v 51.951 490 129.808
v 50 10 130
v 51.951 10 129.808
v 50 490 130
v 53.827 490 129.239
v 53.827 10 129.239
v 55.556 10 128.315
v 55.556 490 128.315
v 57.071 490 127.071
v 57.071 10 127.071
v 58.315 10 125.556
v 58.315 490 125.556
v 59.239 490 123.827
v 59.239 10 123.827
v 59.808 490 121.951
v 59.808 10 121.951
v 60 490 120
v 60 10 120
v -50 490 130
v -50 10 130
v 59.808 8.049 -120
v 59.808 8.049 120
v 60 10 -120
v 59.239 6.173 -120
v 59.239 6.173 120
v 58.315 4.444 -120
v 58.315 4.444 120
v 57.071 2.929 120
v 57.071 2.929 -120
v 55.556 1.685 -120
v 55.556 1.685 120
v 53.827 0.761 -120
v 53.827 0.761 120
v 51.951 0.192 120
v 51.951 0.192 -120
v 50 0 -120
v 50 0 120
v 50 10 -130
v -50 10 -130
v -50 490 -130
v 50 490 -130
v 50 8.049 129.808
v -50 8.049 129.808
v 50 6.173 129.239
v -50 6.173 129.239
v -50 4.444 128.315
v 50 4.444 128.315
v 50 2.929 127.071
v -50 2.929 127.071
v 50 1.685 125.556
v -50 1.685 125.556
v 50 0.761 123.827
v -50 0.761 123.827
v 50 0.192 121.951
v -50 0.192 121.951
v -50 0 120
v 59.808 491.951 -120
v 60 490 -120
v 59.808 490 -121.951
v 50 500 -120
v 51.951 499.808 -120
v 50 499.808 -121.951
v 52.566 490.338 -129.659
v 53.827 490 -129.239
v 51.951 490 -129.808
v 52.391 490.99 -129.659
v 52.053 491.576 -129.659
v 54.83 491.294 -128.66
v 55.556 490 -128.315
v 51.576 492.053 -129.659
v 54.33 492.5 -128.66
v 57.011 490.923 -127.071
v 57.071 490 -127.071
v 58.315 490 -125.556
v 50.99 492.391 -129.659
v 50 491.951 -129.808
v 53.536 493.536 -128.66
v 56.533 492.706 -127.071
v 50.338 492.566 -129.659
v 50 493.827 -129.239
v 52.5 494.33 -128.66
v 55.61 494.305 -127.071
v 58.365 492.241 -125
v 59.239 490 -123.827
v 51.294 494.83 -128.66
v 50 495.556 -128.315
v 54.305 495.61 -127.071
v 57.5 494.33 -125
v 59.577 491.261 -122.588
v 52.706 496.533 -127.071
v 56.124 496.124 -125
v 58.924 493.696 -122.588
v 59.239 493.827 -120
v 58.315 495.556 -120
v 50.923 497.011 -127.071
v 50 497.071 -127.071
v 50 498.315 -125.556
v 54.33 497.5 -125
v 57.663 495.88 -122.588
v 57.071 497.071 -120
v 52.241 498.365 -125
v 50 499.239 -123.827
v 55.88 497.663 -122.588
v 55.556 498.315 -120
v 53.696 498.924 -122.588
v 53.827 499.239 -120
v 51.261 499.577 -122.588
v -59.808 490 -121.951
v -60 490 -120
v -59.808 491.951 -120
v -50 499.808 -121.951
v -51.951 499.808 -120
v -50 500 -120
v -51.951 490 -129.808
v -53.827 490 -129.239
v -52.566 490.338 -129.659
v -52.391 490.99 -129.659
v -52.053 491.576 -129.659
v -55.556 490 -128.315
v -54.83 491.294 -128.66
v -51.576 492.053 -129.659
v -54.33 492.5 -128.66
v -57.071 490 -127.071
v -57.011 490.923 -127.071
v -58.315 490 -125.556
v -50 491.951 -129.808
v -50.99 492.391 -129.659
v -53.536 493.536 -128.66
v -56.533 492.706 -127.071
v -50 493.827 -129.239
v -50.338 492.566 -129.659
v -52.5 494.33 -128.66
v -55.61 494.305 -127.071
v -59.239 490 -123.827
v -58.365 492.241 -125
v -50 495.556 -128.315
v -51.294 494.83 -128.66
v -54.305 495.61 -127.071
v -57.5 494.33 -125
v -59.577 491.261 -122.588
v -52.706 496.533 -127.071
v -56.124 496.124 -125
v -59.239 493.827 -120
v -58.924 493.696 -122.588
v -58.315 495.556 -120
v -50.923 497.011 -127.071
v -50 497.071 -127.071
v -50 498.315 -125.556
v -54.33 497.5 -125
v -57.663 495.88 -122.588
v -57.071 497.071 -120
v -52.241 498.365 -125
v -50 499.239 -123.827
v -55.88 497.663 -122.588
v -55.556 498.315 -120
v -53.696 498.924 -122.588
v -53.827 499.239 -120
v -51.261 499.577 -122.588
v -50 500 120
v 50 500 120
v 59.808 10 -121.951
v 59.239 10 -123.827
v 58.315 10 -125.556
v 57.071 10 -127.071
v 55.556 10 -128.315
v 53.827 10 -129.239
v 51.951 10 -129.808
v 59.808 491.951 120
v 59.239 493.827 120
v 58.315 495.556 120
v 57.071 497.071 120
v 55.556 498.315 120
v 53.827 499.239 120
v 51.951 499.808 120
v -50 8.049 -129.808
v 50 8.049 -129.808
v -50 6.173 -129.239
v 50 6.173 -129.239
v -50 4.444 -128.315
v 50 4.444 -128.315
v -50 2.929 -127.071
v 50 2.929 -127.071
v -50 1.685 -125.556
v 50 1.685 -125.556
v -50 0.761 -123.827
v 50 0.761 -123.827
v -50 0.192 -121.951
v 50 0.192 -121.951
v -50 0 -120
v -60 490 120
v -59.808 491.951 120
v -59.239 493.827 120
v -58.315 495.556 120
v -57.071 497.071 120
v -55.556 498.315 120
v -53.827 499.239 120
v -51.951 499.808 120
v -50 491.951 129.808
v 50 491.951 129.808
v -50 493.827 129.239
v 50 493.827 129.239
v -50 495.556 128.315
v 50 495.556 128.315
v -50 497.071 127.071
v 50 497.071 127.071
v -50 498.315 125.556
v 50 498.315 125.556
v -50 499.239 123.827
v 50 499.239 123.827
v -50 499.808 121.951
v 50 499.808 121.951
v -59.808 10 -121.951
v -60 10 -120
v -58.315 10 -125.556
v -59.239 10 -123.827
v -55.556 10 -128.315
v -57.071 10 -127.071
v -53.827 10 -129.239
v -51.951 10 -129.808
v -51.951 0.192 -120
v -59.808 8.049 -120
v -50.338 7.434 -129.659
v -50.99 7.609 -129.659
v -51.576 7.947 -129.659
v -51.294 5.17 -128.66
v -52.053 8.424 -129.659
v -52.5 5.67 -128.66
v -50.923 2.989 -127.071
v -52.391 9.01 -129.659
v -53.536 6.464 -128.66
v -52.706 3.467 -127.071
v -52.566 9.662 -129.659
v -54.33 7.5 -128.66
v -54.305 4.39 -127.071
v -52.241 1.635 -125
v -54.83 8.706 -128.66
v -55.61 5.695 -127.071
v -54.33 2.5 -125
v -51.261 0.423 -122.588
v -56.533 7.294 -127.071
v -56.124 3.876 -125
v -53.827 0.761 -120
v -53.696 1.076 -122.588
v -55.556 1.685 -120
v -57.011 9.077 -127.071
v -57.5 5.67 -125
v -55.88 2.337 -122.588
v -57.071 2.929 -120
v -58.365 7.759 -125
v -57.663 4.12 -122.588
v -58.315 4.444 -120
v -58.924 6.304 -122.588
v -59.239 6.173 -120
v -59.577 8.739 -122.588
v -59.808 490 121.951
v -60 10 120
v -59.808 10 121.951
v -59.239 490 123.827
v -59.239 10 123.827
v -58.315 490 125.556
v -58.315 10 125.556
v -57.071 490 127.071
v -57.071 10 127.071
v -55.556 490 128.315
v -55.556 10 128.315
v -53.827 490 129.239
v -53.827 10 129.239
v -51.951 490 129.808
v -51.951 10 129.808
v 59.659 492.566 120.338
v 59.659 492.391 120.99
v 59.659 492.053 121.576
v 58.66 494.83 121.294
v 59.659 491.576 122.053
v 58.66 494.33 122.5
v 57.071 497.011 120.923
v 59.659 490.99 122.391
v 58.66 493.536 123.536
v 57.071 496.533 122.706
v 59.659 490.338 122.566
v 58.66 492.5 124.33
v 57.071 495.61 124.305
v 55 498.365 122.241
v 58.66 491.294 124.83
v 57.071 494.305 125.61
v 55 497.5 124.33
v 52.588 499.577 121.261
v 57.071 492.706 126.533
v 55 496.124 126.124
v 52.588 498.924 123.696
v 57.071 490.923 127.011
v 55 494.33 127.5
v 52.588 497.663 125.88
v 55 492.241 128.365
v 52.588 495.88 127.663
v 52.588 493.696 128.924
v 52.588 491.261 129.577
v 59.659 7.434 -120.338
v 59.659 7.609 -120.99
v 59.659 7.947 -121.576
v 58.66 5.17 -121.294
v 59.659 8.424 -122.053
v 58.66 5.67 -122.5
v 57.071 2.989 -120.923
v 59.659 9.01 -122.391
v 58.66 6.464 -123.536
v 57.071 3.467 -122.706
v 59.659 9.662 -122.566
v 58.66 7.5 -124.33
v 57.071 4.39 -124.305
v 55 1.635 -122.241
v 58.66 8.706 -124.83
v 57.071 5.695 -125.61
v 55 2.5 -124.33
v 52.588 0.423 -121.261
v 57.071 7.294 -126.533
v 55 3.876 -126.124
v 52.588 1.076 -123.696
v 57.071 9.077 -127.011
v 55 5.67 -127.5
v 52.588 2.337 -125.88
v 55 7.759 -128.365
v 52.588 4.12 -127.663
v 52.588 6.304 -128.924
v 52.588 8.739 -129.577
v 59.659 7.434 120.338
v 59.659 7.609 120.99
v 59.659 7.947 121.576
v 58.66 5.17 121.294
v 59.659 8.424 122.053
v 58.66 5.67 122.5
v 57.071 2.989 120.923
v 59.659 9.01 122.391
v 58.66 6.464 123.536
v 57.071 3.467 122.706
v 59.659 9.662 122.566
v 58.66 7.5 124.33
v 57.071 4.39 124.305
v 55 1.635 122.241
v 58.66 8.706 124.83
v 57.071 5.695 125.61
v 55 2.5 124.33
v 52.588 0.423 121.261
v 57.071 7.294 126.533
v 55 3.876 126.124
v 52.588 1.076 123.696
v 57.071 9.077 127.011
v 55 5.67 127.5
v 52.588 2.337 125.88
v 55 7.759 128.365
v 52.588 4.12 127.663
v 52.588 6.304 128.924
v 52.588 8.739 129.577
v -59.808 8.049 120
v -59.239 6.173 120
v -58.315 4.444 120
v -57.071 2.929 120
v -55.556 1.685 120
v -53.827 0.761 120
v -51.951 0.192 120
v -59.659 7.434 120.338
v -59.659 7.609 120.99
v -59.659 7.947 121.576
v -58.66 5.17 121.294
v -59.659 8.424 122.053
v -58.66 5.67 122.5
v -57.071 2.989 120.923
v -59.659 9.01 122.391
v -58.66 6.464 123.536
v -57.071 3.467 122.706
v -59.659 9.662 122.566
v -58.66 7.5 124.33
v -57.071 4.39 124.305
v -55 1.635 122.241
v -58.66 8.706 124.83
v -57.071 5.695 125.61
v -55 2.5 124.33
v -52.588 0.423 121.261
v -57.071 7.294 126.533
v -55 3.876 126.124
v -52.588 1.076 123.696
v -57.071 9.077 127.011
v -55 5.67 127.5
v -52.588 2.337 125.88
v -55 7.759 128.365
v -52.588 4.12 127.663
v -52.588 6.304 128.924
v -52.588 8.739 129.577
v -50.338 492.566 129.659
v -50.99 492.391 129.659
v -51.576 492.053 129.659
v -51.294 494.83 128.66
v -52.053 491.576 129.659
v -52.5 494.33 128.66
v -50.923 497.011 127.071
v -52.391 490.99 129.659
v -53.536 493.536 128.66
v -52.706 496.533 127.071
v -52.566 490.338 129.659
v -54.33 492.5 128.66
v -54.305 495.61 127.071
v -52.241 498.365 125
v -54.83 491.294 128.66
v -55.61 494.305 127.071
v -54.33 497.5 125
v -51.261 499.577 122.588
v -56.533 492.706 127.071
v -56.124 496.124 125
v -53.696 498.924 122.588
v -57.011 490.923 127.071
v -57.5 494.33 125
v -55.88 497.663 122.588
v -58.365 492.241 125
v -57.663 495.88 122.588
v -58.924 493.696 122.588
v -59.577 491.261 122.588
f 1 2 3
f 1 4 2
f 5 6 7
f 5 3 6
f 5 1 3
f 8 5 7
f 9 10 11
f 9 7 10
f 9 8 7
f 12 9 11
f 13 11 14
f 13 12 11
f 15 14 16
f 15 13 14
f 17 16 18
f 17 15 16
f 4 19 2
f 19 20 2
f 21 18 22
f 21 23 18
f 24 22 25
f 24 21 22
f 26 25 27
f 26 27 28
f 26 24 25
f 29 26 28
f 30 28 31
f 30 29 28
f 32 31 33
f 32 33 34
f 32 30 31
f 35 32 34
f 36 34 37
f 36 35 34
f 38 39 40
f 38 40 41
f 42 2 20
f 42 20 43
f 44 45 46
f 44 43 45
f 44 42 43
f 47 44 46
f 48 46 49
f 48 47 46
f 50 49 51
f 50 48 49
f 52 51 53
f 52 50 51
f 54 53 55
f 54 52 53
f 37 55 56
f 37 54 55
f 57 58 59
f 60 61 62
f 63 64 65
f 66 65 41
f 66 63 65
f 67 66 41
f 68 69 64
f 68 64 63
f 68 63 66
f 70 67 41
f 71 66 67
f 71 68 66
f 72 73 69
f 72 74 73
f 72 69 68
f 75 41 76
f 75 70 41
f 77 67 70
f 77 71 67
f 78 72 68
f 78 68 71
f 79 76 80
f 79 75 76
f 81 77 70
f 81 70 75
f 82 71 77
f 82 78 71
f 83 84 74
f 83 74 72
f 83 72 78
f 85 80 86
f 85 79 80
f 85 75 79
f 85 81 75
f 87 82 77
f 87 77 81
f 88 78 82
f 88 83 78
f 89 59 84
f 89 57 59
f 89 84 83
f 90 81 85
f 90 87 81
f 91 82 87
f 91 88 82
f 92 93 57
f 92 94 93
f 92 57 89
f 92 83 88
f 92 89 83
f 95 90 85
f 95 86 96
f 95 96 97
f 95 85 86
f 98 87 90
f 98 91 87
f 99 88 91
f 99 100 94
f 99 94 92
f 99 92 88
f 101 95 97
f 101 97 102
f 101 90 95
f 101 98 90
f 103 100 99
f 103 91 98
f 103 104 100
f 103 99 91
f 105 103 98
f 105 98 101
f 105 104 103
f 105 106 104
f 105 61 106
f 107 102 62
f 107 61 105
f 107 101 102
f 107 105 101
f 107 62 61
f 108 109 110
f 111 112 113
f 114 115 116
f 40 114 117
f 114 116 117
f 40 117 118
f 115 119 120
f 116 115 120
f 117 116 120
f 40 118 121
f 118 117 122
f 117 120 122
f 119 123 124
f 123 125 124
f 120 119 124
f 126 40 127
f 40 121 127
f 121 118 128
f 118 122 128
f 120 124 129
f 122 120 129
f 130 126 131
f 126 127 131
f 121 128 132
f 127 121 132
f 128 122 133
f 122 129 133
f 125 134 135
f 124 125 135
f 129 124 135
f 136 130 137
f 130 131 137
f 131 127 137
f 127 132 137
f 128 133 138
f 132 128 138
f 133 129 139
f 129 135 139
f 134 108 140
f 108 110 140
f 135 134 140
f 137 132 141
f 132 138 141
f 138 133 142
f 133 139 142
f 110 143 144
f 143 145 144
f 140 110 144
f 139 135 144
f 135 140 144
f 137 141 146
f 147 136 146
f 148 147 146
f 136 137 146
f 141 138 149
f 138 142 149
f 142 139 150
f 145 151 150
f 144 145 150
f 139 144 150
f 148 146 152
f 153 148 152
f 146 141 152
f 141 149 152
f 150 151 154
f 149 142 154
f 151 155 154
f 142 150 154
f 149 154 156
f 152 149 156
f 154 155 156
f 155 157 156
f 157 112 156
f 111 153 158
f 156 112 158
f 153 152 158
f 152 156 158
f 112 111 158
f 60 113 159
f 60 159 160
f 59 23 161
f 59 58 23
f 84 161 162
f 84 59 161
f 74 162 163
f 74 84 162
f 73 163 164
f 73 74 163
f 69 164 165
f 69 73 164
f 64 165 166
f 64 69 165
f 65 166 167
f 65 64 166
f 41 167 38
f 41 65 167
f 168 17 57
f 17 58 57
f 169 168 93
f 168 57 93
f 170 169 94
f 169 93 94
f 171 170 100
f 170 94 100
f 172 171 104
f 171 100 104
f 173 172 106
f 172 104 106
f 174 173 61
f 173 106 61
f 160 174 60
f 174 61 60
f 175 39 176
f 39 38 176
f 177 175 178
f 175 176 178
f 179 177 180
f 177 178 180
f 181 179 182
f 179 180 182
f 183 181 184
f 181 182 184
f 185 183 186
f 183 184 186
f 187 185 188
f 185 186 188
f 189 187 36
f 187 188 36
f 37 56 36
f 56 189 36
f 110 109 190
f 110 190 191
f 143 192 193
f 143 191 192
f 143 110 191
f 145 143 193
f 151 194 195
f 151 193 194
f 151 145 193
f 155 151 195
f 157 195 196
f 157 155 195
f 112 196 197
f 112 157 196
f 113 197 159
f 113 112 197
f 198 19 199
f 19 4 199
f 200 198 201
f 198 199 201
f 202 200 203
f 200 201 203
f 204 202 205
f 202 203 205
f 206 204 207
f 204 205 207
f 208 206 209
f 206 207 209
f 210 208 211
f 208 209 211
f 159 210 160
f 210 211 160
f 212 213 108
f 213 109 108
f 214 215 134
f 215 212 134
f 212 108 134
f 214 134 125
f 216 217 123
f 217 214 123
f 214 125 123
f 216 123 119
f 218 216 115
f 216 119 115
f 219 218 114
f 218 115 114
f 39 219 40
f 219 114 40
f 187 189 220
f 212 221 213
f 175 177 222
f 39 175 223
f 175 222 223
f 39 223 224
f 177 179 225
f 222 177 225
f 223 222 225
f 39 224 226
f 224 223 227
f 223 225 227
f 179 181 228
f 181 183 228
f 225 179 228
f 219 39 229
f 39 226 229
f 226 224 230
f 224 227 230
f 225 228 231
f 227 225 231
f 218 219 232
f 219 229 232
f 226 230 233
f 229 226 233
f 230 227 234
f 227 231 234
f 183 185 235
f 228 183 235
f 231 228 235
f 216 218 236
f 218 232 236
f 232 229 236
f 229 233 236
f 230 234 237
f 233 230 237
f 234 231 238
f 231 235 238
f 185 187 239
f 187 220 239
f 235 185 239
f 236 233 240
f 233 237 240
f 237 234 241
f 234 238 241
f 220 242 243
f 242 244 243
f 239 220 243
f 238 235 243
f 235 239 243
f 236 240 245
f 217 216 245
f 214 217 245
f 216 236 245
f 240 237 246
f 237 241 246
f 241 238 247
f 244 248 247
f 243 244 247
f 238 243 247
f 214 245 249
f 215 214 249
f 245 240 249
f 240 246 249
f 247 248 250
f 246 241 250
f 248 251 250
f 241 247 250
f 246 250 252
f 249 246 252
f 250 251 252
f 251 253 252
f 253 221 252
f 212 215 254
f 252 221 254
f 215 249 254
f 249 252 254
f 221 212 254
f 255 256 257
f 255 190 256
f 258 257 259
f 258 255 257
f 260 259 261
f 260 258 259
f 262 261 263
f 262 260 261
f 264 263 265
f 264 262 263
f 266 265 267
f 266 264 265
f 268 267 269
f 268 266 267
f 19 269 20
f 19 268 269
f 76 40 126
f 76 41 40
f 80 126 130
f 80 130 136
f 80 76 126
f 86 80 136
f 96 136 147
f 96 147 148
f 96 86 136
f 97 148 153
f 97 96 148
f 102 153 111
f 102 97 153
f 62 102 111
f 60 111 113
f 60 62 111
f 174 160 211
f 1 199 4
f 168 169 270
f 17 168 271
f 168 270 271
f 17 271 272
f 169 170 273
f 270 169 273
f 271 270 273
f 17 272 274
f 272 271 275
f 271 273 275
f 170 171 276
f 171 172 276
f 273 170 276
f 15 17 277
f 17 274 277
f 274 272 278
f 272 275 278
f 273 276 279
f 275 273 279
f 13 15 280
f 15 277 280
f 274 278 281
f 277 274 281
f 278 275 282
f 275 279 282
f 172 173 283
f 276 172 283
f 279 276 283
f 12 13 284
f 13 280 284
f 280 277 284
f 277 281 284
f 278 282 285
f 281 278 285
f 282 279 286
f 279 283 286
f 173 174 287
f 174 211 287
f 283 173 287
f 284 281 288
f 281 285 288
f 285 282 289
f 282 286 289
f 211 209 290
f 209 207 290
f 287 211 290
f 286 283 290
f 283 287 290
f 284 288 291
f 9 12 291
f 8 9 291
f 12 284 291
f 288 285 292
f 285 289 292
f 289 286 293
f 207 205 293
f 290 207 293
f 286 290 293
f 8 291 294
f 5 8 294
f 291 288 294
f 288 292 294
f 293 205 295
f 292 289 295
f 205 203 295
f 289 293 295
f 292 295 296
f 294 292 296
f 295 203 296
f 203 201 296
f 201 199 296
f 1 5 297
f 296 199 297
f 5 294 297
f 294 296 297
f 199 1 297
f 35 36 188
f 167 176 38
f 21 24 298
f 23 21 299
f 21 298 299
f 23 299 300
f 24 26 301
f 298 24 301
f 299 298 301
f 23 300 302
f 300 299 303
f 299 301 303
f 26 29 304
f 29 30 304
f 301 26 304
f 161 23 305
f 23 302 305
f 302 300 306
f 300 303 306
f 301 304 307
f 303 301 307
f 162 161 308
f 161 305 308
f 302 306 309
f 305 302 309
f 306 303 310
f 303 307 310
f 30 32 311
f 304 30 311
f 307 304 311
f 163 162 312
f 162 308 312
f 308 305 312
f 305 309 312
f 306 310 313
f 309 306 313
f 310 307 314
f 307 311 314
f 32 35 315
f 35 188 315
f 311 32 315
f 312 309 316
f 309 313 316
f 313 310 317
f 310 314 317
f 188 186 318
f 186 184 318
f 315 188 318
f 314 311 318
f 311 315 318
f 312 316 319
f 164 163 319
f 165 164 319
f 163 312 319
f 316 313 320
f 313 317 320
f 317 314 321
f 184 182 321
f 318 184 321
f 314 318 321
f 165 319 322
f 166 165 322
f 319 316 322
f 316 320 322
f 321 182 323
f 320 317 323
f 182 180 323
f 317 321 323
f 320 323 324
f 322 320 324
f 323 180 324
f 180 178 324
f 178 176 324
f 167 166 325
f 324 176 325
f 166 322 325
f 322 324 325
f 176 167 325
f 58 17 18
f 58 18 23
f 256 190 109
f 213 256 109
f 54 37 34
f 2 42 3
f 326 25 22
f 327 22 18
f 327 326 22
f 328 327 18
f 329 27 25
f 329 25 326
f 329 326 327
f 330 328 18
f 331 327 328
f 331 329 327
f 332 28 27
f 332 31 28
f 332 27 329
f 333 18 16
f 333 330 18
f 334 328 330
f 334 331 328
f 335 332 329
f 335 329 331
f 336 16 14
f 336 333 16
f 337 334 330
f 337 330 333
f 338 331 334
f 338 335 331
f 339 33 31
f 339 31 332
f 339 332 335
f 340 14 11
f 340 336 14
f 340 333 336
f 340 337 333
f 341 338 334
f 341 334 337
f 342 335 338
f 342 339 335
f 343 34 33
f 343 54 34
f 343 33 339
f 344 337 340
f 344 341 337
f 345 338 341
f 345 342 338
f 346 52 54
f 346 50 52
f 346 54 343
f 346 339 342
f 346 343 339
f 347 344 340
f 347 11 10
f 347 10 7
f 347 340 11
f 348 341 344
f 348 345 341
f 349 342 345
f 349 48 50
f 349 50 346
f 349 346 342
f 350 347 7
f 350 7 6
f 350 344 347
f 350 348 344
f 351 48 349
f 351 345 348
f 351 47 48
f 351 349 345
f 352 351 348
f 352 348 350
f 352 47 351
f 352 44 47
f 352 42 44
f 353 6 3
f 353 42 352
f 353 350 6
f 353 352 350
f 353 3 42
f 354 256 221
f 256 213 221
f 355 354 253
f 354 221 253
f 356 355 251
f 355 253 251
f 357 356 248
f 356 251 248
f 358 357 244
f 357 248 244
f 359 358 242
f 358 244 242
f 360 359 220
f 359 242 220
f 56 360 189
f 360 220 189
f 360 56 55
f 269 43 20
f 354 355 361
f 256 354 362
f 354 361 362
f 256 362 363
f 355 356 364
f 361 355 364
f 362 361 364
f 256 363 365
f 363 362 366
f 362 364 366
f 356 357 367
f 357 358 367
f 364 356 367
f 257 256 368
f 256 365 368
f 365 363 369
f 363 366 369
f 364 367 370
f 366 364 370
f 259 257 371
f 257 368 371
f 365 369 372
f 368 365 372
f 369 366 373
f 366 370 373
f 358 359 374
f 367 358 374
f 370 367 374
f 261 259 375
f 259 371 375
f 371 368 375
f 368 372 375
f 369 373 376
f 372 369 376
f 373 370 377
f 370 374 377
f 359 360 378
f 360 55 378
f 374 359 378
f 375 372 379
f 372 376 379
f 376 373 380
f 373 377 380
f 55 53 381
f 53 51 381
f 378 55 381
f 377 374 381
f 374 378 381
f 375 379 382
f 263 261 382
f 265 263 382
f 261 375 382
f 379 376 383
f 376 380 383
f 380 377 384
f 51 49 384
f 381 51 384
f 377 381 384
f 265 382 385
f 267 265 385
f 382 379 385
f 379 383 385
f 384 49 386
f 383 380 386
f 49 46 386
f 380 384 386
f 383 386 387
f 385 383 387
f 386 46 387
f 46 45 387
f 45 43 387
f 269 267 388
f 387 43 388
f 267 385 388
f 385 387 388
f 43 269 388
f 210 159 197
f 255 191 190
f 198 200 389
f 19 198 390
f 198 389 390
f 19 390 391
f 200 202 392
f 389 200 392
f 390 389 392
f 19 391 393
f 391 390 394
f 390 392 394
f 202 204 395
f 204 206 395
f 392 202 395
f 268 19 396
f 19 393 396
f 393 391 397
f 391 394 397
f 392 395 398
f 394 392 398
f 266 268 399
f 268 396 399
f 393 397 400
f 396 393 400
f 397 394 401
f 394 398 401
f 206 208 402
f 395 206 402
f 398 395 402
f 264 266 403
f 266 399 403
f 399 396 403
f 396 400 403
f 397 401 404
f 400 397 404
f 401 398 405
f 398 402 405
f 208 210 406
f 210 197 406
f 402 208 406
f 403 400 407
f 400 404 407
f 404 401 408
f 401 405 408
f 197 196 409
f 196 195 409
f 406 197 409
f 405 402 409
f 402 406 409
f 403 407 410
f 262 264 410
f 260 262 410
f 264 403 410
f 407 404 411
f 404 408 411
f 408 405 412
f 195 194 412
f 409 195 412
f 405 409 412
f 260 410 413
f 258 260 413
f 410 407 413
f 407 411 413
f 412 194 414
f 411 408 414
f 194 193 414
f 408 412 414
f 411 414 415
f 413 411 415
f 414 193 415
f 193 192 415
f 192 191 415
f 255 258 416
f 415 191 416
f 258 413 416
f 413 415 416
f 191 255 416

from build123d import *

# Parameters (mm, degrees)
ESBO_O1_W                = 120
ESBO_O1_H                = 260
RESSALTO_EXTRUS_O1_DEPTH = 500
FILETE1_R                = 10


with BuildPart() as part:
    # Esboço1 → Ressalto-extrusão1 (new body)
    with BuildSketch(Plane(origin=(0, 0, 0), x_dir=(1, 0, 0), z_dir=(0, 1, 0))):
        Rectangle(ESBO_O1_W, ESBO_O1_H)
    extrude(amount=RESSALTO_EXTRUS_O1_DEPTH)

    # Filete1
    filete1_edges = [part.edges().sort_by_distance(p)[0] for p in [
        (-60, 500, 0),
        (0, 500, 130),
        (60, 500, 0),
        (0, 0, 130),
        (-60, 0, 0),
        (0, 0, -130),
        (60, 0, 0),
        (60, 250, 130),
        (-60, 250, 130),
        (-60, 250, -130),
        (60, 250, -130),
        (0, 500, -130),
    ]]
    fillet(filete1_edges, radius=FILETE1_R)


solid = part.part
